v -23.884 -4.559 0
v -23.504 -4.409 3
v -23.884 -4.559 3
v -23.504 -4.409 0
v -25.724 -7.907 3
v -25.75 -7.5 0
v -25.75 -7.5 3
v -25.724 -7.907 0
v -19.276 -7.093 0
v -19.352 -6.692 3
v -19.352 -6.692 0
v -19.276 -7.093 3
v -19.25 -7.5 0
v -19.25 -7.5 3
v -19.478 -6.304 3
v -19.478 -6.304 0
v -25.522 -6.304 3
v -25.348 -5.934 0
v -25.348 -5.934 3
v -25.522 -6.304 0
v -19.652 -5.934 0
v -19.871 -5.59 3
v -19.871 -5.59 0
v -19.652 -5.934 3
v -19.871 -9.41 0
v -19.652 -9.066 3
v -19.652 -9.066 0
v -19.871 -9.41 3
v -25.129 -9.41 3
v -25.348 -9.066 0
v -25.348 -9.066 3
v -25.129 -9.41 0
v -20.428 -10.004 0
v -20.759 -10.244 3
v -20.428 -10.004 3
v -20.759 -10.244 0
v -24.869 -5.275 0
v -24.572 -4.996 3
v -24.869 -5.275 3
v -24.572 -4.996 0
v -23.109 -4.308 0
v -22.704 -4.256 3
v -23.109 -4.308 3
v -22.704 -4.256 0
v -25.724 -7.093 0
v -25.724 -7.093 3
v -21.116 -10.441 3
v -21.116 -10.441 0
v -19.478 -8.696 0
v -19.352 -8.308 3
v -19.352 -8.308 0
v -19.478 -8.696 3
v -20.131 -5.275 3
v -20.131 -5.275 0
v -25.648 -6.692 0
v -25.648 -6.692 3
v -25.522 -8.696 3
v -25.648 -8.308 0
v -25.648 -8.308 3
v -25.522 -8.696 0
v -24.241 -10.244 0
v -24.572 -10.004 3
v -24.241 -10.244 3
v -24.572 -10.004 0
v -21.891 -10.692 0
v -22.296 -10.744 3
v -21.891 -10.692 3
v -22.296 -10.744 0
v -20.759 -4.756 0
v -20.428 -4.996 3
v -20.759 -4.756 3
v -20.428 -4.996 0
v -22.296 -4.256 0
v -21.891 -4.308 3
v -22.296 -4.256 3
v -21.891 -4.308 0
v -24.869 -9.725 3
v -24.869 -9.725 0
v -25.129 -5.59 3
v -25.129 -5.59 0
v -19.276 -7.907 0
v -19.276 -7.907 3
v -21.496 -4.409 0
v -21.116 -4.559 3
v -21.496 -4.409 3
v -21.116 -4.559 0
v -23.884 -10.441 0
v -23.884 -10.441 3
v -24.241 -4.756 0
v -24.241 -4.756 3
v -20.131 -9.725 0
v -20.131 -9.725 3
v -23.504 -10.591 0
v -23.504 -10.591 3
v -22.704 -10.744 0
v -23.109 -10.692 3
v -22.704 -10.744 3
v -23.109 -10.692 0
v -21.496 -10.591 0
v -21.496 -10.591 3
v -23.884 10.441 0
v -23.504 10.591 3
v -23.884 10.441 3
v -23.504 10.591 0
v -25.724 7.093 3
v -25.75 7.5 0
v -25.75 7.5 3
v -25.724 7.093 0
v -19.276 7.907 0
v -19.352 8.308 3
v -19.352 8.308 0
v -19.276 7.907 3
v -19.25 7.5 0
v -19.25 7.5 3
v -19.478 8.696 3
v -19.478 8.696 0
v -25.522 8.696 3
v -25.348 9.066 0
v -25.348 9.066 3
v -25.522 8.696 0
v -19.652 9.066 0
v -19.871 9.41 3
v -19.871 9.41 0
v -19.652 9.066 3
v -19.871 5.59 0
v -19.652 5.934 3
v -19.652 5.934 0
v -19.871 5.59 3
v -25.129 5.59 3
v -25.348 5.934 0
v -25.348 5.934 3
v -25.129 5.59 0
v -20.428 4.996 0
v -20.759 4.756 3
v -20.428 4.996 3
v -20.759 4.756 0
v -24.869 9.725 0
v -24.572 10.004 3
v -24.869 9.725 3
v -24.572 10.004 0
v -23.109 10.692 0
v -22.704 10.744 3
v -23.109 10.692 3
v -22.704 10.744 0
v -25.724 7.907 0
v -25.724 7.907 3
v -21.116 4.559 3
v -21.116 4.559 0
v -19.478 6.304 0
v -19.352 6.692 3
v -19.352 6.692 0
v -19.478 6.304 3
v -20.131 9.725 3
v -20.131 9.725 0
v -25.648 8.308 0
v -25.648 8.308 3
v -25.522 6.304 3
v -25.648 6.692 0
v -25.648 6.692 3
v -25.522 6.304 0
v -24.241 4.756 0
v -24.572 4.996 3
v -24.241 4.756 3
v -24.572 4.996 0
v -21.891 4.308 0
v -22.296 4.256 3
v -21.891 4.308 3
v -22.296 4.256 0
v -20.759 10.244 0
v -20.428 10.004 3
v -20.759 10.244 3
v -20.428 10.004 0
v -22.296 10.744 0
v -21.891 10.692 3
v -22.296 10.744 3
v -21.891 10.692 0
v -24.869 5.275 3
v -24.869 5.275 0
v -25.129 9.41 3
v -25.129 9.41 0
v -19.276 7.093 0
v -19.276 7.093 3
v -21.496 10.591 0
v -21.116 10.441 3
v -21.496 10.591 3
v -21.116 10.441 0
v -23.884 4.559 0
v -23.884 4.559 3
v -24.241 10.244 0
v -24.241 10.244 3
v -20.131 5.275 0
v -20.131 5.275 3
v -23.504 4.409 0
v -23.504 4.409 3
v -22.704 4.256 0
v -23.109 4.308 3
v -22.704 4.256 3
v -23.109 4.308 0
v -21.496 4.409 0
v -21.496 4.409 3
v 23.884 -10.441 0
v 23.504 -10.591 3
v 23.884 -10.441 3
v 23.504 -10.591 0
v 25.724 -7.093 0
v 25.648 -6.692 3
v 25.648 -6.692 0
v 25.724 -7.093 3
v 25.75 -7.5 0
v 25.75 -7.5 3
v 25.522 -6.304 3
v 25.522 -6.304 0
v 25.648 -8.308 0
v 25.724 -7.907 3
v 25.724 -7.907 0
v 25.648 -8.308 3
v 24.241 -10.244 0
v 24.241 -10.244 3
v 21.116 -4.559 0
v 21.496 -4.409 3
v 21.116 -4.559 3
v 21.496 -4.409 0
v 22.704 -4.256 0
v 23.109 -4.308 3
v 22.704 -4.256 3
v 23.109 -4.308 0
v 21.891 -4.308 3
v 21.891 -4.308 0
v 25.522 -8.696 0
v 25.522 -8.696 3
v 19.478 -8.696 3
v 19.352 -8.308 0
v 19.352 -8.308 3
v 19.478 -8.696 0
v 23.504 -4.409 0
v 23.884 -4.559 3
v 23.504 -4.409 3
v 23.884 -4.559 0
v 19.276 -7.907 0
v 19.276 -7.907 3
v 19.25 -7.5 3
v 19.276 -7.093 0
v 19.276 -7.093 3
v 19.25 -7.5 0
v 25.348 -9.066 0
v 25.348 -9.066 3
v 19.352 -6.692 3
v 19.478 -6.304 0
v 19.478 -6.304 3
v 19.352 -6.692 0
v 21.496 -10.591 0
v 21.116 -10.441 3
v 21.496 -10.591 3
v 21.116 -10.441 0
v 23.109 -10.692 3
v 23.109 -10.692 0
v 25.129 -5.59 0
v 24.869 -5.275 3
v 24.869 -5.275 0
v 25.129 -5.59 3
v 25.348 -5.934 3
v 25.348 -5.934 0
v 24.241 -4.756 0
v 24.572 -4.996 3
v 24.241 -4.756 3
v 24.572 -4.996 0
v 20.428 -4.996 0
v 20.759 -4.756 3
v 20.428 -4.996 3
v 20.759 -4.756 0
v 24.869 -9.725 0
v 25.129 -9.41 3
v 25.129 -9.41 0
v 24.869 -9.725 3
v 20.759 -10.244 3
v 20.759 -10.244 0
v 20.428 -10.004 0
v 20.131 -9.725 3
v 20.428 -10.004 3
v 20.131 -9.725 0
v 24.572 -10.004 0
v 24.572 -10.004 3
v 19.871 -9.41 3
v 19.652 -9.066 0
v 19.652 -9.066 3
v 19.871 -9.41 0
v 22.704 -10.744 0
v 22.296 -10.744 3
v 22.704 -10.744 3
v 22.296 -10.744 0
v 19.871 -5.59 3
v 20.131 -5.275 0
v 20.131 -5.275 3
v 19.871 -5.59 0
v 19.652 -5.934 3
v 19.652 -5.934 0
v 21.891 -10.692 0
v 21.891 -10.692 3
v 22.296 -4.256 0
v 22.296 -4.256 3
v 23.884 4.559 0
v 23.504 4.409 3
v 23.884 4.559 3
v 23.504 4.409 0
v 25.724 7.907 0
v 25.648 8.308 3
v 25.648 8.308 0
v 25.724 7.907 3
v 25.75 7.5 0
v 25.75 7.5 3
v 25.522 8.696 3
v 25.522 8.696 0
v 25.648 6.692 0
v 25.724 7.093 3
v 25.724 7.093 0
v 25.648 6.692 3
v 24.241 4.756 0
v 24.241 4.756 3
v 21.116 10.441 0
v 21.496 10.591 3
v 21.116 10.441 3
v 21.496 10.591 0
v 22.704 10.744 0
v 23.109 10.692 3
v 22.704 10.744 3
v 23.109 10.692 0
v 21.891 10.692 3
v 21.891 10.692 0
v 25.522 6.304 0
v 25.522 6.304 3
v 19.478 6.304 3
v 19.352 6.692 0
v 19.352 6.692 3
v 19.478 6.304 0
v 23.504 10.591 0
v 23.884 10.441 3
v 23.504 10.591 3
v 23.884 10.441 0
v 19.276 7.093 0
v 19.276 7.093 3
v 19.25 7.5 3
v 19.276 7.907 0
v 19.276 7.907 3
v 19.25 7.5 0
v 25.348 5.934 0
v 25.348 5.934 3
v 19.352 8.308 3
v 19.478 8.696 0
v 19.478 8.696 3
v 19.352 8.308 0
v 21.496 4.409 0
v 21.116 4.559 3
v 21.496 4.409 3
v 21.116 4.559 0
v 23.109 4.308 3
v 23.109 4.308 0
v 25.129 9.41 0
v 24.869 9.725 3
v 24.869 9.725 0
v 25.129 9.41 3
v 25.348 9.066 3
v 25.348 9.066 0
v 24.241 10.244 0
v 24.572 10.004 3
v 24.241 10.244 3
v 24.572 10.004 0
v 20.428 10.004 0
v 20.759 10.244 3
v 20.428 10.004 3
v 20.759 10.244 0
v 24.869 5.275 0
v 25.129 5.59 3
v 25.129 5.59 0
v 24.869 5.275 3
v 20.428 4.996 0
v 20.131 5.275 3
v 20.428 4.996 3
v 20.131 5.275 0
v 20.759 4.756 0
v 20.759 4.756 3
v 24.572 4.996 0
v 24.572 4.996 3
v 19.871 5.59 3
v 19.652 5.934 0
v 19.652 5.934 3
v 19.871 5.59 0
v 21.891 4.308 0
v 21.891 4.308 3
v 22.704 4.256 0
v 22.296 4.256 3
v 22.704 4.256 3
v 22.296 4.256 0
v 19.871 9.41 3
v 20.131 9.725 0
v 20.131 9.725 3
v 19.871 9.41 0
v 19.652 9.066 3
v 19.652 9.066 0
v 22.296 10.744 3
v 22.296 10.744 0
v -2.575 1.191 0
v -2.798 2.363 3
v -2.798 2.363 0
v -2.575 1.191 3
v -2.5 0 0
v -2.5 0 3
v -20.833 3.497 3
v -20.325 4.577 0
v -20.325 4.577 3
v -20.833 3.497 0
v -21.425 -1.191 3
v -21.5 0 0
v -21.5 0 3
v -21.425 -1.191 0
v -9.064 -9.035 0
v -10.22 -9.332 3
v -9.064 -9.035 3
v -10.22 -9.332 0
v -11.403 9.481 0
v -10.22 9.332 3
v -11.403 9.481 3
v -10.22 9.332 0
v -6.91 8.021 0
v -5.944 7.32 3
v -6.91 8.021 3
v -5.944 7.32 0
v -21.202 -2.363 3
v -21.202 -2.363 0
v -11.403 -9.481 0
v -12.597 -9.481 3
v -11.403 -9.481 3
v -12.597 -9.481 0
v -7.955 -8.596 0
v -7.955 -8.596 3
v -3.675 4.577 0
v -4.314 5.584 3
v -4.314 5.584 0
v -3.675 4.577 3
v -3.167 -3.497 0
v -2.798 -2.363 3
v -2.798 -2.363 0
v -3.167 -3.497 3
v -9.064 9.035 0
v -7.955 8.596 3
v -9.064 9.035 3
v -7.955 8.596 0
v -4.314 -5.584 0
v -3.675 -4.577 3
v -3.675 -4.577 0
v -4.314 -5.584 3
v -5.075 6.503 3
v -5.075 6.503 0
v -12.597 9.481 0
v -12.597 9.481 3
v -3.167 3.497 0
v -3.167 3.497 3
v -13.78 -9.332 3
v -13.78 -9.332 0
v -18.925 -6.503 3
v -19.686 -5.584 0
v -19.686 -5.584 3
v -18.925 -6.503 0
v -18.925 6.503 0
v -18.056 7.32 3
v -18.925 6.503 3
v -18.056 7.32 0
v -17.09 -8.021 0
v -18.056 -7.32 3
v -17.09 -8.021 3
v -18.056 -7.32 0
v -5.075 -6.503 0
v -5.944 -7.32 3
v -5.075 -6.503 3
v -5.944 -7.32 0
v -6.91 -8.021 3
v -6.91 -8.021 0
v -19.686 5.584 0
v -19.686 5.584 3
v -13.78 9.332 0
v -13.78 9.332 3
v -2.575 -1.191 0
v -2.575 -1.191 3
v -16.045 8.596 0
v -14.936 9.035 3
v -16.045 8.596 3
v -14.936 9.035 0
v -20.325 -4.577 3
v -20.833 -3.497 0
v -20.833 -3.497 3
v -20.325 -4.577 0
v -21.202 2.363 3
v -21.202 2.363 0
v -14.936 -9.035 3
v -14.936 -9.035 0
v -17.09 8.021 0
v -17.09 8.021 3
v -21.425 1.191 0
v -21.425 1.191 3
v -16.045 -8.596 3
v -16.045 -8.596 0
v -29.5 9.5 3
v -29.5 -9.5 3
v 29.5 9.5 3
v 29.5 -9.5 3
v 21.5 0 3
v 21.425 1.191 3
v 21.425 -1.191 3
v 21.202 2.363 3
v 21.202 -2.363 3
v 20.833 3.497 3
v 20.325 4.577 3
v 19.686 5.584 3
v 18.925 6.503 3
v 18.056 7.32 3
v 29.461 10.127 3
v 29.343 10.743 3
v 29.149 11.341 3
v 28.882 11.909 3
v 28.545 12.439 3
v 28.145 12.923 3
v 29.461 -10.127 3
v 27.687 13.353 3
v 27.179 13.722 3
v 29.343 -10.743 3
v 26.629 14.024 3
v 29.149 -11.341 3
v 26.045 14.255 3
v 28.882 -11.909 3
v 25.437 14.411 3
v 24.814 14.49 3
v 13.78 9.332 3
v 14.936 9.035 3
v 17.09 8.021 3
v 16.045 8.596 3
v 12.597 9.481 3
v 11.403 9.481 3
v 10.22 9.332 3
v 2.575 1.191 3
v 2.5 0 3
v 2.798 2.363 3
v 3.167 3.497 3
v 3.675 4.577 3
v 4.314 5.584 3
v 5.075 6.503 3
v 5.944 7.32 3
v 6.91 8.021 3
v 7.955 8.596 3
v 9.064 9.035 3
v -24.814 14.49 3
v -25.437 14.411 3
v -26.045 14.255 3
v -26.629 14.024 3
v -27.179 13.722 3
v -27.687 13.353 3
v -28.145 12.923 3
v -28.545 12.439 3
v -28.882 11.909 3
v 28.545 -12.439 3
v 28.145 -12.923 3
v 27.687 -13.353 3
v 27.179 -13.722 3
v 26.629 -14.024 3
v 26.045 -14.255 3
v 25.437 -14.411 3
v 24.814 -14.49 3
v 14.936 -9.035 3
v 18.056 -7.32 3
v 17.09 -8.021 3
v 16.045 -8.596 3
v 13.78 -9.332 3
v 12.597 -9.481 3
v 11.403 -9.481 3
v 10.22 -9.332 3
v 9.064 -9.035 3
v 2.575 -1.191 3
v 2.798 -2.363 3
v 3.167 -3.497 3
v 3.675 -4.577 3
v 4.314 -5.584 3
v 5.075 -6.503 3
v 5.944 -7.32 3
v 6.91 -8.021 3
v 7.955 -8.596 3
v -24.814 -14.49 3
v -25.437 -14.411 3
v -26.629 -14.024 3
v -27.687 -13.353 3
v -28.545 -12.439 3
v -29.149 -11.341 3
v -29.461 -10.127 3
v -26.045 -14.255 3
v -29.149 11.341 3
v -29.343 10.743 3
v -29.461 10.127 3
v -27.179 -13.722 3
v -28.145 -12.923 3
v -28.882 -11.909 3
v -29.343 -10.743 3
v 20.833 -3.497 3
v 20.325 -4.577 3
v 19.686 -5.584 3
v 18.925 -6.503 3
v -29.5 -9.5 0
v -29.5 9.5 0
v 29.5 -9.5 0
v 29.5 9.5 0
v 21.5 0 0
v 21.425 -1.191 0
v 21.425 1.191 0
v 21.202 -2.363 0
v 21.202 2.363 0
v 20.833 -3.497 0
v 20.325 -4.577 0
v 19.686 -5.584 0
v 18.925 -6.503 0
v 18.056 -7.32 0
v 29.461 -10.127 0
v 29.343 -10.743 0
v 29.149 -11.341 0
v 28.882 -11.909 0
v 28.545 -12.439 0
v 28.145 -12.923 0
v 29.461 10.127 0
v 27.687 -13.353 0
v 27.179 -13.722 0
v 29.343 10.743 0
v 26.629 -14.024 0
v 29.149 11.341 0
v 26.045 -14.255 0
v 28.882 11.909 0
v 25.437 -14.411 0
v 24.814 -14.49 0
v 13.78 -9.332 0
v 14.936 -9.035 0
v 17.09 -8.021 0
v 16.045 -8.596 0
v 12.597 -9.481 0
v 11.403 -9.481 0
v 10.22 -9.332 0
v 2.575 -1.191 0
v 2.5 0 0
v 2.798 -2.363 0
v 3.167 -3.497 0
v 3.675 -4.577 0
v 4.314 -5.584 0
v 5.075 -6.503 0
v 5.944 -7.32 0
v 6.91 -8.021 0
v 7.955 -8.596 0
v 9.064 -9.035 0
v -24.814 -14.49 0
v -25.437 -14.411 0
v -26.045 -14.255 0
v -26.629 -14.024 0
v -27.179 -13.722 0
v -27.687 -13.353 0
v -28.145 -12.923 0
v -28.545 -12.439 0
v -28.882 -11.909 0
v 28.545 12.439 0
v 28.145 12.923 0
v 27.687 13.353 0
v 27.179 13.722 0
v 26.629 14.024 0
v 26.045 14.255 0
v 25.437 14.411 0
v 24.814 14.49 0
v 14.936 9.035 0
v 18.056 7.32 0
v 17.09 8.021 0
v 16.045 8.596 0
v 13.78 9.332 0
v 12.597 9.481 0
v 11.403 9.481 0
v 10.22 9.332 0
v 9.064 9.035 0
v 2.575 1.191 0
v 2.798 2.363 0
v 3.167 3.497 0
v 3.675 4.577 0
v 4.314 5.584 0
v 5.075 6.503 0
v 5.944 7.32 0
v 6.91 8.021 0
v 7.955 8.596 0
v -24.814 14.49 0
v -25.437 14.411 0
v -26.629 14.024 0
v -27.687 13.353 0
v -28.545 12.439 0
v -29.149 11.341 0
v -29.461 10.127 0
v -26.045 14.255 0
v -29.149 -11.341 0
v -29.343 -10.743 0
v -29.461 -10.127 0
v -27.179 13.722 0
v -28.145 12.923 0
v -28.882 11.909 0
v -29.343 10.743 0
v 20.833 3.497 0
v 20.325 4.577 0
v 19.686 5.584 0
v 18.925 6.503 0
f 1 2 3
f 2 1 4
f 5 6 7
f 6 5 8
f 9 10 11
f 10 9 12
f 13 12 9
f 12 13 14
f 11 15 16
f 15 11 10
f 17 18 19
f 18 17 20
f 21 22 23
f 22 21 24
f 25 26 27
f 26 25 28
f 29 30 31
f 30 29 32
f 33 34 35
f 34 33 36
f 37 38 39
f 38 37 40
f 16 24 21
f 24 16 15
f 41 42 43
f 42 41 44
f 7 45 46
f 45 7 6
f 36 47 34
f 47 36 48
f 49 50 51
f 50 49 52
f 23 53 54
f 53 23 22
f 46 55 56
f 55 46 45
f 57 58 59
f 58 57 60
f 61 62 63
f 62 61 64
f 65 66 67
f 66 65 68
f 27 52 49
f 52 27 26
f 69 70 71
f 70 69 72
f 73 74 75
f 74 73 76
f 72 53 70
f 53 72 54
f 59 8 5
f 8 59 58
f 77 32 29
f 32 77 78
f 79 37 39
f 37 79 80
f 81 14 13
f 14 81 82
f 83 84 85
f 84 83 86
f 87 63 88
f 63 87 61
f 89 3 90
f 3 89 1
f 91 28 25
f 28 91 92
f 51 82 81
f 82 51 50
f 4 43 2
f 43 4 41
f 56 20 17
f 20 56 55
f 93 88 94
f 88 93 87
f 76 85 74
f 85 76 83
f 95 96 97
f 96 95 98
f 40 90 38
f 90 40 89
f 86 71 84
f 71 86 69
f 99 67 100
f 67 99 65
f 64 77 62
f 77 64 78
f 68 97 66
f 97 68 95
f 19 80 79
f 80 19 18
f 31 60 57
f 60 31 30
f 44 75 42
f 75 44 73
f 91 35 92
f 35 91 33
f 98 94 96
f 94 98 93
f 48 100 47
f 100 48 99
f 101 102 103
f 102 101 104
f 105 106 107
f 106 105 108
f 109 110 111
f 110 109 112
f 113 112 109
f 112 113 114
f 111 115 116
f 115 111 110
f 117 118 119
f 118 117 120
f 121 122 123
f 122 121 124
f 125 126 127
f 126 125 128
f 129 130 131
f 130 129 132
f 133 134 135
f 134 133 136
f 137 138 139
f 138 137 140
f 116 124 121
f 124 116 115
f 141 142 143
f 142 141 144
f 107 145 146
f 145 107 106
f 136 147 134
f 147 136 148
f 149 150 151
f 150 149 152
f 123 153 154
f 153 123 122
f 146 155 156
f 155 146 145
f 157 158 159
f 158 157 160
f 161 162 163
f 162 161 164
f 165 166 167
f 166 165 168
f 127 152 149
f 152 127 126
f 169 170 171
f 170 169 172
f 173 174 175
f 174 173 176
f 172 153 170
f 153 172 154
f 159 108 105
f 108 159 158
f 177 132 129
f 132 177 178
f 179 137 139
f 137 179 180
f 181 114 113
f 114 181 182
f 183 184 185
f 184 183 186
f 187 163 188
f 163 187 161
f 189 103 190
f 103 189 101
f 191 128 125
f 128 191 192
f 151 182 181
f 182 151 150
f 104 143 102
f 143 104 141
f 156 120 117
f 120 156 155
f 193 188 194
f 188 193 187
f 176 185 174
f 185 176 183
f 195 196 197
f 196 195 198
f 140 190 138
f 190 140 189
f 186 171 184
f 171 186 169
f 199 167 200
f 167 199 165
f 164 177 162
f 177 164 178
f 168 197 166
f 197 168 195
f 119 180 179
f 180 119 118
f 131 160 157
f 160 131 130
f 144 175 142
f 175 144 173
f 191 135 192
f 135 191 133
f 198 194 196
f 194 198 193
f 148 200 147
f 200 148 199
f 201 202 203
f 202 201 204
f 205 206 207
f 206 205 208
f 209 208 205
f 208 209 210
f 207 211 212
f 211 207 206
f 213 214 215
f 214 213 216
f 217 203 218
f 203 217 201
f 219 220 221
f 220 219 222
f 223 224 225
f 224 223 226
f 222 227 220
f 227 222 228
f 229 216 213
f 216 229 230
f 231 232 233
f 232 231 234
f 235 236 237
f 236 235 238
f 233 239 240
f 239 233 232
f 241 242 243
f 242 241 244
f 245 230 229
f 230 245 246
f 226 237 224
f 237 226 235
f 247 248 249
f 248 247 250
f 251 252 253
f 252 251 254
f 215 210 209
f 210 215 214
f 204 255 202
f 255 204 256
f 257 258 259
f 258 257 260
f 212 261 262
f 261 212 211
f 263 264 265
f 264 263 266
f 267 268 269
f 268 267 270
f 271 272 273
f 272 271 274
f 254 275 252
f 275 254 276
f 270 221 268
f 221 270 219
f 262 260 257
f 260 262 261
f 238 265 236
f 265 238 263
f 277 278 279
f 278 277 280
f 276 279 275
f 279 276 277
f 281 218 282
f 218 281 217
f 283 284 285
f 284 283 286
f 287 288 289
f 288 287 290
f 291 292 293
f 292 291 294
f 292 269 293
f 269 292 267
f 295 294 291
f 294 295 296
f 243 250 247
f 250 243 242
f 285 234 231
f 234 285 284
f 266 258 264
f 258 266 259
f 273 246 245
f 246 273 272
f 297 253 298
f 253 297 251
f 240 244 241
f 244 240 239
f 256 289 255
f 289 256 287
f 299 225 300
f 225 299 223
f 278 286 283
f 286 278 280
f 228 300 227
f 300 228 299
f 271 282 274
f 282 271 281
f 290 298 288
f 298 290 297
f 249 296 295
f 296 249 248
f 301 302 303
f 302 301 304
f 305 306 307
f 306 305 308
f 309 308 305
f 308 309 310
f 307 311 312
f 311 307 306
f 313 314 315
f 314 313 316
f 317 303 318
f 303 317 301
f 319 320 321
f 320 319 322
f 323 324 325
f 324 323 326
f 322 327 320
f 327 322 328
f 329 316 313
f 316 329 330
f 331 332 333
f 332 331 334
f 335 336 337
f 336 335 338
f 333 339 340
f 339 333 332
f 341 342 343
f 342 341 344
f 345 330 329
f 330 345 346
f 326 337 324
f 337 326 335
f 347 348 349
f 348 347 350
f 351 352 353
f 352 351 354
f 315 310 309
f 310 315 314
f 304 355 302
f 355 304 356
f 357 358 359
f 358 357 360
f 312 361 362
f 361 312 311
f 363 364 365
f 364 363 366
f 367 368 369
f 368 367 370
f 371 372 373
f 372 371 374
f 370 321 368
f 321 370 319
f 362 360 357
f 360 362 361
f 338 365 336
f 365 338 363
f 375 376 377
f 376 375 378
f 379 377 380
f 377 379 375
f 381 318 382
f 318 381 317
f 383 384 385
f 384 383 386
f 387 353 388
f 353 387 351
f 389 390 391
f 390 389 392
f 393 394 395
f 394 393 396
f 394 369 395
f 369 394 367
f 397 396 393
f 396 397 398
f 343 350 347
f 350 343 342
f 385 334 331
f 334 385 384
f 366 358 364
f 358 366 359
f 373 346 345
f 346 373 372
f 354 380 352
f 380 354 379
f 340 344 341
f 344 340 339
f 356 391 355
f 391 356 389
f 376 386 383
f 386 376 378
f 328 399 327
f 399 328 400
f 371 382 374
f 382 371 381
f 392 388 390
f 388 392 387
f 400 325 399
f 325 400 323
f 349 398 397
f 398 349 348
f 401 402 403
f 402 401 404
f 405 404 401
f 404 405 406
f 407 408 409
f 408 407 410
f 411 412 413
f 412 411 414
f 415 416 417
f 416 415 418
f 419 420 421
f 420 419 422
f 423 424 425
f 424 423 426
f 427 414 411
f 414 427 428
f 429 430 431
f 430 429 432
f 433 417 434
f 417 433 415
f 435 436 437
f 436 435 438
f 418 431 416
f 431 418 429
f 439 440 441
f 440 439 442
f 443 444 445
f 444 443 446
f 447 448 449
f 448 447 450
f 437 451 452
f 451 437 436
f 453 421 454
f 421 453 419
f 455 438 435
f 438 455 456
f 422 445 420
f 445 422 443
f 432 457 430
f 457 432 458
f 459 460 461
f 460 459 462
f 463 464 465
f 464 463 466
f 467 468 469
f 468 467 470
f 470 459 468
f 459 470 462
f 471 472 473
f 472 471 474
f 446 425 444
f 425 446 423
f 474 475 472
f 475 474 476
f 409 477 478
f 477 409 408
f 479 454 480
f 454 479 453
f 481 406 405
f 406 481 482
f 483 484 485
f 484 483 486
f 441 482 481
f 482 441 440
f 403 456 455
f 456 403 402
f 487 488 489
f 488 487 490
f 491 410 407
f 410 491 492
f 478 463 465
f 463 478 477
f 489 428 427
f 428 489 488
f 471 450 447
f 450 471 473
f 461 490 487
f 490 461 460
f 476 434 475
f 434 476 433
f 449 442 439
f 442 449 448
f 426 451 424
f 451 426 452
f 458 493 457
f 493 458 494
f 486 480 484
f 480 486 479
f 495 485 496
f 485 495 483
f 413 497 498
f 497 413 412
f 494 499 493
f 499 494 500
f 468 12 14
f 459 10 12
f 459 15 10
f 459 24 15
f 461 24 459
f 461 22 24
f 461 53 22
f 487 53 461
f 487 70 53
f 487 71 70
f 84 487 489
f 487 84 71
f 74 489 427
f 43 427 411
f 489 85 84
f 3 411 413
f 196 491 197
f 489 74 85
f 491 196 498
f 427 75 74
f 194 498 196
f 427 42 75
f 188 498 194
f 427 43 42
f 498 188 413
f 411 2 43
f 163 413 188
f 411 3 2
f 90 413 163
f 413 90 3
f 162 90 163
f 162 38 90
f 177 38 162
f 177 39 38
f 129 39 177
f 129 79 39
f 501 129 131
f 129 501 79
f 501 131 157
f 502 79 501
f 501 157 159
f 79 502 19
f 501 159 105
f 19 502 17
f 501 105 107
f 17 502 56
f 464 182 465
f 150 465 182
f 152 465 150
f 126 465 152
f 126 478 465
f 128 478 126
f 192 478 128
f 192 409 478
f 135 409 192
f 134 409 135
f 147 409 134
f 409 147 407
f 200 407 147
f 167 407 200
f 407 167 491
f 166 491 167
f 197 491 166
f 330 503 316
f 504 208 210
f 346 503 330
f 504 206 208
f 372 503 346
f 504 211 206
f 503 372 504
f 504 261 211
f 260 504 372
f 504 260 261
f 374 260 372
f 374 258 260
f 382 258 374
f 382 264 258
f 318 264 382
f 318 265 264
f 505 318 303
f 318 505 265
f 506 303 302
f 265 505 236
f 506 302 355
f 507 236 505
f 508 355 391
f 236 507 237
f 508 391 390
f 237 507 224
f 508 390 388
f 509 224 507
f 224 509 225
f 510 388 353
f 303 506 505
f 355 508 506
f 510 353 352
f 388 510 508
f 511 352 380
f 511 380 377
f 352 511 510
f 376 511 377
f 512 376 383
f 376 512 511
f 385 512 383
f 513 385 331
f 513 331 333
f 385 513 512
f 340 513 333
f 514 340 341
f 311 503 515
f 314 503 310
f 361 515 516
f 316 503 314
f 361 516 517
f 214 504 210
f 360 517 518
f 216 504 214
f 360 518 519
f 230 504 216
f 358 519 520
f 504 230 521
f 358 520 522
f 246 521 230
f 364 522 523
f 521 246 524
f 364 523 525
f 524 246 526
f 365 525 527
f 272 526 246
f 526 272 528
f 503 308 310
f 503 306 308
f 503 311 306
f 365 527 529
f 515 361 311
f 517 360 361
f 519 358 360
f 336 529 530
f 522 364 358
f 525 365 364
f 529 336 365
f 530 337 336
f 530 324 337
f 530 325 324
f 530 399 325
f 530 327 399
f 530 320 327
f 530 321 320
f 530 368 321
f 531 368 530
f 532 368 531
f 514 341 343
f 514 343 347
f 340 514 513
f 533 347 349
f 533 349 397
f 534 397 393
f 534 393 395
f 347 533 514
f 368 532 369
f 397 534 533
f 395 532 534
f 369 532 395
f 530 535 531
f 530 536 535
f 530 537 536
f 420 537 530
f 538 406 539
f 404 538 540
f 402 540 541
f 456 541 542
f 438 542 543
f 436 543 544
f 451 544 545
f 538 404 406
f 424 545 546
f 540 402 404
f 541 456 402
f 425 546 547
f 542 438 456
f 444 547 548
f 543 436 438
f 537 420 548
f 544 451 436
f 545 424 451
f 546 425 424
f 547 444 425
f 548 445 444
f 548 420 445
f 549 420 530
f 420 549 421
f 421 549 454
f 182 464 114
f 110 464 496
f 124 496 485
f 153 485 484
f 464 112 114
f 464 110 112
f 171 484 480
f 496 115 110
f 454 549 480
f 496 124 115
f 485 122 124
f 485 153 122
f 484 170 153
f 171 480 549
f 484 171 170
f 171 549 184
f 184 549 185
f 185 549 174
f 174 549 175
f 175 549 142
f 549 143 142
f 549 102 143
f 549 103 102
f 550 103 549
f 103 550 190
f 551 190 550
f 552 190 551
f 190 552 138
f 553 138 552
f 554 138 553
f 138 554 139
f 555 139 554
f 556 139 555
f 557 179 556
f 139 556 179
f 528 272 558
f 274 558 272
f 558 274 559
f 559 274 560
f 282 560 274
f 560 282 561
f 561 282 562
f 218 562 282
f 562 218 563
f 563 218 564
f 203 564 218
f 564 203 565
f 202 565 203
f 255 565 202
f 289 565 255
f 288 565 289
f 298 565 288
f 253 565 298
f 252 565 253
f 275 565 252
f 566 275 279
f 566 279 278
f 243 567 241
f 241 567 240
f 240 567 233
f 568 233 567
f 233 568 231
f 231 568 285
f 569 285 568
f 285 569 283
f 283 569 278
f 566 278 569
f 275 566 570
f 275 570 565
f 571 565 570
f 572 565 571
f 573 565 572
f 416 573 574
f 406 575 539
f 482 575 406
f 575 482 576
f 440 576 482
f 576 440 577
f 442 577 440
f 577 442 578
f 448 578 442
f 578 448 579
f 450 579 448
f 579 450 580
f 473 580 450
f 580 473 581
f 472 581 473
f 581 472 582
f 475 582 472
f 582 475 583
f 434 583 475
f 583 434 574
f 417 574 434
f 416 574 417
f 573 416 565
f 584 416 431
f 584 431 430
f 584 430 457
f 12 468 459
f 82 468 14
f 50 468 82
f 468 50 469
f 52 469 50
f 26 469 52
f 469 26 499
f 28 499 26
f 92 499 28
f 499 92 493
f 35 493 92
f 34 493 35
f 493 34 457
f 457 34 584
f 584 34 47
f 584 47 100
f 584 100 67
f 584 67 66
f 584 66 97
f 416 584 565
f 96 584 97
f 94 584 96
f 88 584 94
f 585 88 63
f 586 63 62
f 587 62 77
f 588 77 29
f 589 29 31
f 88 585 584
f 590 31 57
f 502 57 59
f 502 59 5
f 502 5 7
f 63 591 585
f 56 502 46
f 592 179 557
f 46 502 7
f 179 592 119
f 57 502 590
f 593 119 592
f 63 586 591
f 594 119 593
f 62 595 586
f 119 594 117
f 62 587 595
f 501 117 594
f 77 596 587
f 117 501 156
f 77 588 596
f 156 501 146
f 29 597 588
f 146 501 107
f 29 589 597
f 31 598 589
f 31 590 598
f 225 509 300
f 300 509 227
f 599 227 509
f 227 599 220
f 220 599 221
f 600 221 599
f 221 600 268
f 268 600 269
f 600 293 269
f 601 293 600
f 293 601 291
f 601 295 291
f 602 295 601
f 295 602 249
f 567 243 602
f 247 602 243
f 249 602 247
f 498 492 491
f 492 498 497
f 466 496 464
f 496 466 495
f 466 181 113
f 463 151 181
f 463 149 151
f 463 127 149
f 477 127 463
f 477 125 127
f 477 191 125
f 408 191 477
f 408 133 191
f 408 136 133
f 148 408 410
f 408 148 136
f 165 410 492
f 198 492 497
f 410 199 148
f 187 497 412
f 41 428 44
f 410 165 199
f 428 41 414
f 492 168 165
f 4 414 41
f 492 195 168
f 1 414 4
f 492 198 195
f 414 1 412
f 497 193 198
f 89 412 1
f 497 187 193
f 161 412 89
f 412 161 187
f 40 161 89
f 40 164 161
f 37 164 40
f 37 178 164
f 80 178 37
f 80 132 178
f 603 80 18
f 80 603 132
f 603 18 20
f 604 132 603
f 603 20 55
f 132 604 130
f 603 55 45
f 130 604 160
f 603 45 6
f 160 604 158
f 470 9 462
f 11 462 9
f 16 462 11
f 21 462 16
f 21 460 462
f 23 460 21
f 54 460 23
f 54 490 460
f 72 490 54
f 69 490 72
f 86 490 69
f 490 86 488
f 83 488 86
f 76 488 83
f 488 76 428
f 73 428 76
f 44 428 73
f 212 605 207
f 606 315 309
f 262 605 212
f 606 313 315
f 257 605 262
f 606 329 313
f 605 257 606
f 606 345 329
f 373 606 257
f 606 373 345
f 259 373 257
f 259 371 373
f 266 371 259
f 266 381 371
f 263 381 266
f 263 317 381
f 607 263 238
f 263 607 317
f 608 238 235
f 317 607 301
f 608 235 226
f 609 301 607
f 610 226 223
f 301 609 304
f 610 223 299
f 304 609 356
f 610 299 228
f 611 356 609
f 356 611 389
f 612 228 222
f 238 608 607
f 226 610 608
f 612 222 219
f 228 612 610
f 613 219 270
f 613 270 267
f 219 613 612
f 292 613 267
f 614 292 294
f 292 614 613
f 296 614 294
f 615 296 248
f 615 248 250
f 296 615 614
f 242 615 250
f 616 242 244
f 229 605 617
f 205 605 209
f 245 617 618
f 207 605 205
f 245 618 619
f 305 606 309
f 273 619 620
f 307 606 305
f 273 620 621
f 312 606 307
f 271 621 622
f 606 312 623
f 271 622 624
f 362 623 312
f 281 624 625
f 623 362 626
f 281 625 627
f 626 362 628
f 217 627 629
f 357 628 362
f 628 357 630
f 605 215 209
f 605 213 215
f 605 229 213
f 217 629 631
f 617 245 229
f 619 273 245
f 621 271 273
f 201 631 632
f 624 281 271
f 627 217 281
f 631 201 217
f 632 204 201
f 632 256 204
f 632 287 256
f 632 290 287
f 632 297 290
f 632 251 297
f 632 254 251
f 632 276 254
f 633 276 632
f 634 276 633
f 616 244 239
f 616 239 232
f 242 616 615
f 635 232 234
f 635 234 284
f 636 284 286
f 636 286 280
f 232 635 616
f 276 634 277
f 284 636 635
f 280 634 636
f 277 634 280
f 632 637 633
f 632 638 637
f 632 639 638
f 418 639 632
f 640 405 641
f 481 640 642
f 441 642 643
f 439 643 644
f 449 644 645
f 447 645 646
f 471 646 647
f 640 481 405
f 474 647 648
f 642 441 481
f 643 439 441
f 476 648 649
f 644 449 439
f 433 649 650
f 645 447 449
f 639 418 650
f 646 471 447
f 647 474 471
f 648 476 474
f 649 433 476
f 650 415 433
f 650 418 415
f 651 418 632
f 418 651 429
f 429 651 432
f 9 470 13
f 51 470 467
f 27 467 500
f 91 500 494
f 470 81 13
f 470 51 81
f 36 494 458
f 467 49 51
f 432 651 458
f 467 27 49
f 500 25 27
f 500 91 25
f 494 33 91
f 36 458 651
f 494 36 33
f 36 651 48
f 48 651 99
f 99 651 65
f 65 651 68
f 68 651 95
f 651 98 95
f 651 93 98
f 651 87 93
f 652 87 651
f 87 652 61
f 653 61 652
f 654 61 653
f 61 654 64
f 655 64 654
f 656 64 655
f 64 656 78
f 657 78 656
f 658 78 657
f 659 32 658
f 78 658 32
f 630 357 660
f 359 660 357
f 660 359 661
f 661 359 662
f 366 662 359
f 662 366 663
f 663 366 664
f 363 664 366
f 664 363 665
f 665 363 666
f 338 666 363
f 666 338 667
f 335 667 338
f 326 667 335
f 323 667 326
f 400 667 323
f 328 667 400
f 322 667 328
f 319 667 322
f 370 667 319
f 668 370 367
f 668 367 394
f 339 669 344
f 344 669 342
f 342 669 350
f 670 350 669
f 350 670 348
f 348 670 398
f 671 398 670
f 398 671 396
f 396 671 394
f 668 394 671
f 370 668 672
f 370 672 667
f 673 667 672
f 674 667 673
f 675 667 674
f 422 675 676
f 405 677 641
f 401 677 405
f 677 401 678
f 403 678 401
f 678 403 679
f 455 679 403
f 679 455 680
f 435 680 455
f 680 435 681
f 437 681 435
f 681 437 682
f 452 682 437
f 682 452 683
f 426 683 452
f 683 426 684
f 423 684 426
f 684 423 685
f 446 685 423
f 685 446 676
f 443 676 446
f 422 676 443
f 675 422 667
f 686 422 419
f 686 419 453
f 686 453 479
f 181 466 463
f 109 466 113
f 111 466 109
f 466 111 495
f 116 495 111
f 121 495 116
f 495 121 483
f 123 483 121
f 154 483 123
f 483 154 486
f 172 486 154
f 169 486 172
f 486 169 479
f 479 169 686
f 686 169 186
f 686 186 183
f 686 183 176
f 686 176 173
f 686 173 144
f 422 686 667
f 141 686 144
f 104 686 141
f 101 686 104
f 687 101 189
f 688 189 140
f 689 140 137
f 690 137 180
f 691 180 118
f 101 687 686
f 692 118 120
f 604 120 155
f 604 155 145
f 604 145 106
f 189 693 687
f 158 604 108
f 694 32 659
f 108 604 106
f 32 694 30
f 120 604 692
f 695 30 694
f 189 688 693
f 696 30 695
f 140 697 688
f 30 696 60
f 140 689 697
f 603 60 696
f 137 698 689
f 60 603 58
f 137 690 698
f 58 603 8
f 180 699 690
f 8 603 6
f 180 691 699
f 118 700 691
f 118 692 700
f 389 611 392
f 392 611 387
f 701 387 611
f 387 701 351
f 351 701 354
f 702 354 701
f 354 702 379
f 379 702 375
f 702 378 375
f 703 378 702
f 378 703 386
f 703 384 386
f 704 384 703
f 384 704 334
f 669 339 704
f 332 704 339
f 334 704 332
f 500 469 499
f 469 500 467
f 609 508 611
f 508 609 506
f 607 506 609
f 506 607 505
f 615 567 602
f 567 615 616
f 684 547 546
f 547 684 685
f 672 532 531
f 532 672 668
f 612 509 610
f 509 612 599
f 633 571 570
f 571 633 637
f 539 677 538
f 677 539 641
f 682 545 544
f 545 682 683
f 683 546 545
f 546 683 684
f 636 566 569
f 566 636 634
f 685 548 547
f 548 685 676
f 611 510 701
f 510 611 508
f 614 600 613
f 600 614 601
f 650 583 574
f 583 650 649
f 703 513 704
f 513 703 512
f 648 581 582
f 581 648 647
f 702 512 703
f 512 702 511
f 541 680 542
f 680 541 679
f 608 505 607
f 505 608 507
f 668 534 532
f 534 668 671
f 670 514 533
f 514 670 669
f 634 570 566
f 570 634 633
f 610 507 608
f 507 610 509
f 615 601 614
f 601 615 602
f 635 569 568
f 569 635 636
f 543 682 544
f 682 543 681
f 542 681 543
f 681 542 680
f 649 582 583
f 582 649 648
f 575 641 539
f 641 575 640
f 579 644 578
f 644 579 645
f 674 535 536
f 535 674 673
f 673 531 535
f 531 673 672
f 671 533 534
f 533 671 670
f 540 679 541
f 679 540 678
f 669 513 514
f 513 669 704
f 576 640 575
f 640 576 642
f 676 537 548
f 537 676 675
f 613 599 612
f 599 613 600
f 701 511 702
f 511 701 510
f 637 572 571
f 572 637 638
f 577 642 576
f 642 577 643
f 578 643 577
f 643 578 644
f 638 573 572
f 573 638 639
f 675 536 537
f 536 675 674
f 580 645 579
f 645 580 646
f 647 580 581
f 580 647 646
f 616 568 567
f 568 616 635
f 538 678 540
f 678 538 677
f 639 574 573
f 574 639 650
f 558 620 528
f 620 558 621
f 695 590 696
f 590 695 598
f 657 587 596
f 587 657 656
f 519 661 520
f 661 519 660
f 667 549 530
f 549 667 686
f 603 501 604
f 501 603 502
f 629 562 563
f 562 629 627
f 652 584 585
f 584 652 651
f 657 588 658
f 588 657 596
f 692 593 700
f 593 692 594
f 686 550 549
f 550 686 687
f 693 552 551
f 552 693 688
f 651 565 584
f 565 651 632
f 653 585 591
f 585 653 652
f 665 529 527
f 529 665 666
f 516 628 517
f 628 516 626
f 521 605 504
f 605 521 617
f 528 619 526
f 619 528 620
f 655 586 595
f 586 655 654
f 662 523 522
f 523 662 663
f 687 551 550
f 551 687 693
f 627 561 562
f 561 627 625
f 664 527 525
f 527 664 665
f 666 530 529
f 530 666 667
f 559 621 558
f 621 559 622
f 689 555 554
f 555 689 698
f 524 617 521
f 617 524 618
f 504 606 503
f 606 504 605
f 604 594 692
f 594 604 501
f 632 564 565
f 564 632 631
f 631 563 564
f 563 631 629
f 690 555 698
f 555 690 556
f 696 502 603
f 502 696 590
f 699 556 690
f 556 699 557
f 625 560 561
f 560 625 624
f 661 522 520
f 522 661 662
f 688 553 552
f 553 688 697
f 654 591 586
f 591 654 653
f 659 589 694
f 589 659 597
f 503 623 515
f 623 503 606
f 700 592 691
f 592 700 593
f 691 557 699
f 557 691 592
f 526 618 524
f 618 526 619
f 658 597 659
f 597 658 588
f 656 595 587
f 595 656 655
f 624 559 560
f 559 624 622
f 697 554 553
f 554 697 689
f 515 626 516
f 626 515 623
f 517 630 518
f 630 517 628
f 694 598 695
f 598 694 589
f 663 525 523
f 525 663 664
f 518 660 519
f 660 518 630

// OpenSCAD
$fn = 50;


difference() {
	union() {
		hull() {
			translate(v = [-24.5000000000, 9.5000000000, 0]) {
				cylinder(h = 3, r = 5);
			}
			translate(v = [24.5000000000, 9.5000000000, 0]) {
				cylinder(h = 3, r = 5);
			}
			translate(v = [-24.5000000000, -9.5000000000, 0]) {
				cylinder(h = 3, r = 5);
			}
			translate(v = [24.5000000000, -9.5000000000, 0]) {
				cylinder(h = 3, r = 5);
			}
		}
	}
	union() {
		#translate(v = [-22.5000000000, -7.5000000000, -100.0000000000]) {
			cylinder(h = 200, r = 3.2500000000);
		}
		#translate(v = [-22.5000000000, 7.5000000000, -100.0000000000]) {
			cylinder(h = 200, r = 3.2500000000);
		}
		#translate(v = [22.5000000000, -7.5000000000, -100.0000000000]) {
			cylinder(h = 200, r = 3.2500000000);
		}
		#translate(v = [22.5000000000, 7.5000000000, -100.0000000000]) {
			cylinder(h = 200, r = 3.2500000000);
		}
		#translate(v = [-12.0000000000, 0, 0]) {
			cylinder(h = 3, r = 9.5000000000);
		}
		#translate(v = [12.0000000000, 0, 0]) {
			cylinder(h = 3, r = 9.5000000000);
		}
	}
}
